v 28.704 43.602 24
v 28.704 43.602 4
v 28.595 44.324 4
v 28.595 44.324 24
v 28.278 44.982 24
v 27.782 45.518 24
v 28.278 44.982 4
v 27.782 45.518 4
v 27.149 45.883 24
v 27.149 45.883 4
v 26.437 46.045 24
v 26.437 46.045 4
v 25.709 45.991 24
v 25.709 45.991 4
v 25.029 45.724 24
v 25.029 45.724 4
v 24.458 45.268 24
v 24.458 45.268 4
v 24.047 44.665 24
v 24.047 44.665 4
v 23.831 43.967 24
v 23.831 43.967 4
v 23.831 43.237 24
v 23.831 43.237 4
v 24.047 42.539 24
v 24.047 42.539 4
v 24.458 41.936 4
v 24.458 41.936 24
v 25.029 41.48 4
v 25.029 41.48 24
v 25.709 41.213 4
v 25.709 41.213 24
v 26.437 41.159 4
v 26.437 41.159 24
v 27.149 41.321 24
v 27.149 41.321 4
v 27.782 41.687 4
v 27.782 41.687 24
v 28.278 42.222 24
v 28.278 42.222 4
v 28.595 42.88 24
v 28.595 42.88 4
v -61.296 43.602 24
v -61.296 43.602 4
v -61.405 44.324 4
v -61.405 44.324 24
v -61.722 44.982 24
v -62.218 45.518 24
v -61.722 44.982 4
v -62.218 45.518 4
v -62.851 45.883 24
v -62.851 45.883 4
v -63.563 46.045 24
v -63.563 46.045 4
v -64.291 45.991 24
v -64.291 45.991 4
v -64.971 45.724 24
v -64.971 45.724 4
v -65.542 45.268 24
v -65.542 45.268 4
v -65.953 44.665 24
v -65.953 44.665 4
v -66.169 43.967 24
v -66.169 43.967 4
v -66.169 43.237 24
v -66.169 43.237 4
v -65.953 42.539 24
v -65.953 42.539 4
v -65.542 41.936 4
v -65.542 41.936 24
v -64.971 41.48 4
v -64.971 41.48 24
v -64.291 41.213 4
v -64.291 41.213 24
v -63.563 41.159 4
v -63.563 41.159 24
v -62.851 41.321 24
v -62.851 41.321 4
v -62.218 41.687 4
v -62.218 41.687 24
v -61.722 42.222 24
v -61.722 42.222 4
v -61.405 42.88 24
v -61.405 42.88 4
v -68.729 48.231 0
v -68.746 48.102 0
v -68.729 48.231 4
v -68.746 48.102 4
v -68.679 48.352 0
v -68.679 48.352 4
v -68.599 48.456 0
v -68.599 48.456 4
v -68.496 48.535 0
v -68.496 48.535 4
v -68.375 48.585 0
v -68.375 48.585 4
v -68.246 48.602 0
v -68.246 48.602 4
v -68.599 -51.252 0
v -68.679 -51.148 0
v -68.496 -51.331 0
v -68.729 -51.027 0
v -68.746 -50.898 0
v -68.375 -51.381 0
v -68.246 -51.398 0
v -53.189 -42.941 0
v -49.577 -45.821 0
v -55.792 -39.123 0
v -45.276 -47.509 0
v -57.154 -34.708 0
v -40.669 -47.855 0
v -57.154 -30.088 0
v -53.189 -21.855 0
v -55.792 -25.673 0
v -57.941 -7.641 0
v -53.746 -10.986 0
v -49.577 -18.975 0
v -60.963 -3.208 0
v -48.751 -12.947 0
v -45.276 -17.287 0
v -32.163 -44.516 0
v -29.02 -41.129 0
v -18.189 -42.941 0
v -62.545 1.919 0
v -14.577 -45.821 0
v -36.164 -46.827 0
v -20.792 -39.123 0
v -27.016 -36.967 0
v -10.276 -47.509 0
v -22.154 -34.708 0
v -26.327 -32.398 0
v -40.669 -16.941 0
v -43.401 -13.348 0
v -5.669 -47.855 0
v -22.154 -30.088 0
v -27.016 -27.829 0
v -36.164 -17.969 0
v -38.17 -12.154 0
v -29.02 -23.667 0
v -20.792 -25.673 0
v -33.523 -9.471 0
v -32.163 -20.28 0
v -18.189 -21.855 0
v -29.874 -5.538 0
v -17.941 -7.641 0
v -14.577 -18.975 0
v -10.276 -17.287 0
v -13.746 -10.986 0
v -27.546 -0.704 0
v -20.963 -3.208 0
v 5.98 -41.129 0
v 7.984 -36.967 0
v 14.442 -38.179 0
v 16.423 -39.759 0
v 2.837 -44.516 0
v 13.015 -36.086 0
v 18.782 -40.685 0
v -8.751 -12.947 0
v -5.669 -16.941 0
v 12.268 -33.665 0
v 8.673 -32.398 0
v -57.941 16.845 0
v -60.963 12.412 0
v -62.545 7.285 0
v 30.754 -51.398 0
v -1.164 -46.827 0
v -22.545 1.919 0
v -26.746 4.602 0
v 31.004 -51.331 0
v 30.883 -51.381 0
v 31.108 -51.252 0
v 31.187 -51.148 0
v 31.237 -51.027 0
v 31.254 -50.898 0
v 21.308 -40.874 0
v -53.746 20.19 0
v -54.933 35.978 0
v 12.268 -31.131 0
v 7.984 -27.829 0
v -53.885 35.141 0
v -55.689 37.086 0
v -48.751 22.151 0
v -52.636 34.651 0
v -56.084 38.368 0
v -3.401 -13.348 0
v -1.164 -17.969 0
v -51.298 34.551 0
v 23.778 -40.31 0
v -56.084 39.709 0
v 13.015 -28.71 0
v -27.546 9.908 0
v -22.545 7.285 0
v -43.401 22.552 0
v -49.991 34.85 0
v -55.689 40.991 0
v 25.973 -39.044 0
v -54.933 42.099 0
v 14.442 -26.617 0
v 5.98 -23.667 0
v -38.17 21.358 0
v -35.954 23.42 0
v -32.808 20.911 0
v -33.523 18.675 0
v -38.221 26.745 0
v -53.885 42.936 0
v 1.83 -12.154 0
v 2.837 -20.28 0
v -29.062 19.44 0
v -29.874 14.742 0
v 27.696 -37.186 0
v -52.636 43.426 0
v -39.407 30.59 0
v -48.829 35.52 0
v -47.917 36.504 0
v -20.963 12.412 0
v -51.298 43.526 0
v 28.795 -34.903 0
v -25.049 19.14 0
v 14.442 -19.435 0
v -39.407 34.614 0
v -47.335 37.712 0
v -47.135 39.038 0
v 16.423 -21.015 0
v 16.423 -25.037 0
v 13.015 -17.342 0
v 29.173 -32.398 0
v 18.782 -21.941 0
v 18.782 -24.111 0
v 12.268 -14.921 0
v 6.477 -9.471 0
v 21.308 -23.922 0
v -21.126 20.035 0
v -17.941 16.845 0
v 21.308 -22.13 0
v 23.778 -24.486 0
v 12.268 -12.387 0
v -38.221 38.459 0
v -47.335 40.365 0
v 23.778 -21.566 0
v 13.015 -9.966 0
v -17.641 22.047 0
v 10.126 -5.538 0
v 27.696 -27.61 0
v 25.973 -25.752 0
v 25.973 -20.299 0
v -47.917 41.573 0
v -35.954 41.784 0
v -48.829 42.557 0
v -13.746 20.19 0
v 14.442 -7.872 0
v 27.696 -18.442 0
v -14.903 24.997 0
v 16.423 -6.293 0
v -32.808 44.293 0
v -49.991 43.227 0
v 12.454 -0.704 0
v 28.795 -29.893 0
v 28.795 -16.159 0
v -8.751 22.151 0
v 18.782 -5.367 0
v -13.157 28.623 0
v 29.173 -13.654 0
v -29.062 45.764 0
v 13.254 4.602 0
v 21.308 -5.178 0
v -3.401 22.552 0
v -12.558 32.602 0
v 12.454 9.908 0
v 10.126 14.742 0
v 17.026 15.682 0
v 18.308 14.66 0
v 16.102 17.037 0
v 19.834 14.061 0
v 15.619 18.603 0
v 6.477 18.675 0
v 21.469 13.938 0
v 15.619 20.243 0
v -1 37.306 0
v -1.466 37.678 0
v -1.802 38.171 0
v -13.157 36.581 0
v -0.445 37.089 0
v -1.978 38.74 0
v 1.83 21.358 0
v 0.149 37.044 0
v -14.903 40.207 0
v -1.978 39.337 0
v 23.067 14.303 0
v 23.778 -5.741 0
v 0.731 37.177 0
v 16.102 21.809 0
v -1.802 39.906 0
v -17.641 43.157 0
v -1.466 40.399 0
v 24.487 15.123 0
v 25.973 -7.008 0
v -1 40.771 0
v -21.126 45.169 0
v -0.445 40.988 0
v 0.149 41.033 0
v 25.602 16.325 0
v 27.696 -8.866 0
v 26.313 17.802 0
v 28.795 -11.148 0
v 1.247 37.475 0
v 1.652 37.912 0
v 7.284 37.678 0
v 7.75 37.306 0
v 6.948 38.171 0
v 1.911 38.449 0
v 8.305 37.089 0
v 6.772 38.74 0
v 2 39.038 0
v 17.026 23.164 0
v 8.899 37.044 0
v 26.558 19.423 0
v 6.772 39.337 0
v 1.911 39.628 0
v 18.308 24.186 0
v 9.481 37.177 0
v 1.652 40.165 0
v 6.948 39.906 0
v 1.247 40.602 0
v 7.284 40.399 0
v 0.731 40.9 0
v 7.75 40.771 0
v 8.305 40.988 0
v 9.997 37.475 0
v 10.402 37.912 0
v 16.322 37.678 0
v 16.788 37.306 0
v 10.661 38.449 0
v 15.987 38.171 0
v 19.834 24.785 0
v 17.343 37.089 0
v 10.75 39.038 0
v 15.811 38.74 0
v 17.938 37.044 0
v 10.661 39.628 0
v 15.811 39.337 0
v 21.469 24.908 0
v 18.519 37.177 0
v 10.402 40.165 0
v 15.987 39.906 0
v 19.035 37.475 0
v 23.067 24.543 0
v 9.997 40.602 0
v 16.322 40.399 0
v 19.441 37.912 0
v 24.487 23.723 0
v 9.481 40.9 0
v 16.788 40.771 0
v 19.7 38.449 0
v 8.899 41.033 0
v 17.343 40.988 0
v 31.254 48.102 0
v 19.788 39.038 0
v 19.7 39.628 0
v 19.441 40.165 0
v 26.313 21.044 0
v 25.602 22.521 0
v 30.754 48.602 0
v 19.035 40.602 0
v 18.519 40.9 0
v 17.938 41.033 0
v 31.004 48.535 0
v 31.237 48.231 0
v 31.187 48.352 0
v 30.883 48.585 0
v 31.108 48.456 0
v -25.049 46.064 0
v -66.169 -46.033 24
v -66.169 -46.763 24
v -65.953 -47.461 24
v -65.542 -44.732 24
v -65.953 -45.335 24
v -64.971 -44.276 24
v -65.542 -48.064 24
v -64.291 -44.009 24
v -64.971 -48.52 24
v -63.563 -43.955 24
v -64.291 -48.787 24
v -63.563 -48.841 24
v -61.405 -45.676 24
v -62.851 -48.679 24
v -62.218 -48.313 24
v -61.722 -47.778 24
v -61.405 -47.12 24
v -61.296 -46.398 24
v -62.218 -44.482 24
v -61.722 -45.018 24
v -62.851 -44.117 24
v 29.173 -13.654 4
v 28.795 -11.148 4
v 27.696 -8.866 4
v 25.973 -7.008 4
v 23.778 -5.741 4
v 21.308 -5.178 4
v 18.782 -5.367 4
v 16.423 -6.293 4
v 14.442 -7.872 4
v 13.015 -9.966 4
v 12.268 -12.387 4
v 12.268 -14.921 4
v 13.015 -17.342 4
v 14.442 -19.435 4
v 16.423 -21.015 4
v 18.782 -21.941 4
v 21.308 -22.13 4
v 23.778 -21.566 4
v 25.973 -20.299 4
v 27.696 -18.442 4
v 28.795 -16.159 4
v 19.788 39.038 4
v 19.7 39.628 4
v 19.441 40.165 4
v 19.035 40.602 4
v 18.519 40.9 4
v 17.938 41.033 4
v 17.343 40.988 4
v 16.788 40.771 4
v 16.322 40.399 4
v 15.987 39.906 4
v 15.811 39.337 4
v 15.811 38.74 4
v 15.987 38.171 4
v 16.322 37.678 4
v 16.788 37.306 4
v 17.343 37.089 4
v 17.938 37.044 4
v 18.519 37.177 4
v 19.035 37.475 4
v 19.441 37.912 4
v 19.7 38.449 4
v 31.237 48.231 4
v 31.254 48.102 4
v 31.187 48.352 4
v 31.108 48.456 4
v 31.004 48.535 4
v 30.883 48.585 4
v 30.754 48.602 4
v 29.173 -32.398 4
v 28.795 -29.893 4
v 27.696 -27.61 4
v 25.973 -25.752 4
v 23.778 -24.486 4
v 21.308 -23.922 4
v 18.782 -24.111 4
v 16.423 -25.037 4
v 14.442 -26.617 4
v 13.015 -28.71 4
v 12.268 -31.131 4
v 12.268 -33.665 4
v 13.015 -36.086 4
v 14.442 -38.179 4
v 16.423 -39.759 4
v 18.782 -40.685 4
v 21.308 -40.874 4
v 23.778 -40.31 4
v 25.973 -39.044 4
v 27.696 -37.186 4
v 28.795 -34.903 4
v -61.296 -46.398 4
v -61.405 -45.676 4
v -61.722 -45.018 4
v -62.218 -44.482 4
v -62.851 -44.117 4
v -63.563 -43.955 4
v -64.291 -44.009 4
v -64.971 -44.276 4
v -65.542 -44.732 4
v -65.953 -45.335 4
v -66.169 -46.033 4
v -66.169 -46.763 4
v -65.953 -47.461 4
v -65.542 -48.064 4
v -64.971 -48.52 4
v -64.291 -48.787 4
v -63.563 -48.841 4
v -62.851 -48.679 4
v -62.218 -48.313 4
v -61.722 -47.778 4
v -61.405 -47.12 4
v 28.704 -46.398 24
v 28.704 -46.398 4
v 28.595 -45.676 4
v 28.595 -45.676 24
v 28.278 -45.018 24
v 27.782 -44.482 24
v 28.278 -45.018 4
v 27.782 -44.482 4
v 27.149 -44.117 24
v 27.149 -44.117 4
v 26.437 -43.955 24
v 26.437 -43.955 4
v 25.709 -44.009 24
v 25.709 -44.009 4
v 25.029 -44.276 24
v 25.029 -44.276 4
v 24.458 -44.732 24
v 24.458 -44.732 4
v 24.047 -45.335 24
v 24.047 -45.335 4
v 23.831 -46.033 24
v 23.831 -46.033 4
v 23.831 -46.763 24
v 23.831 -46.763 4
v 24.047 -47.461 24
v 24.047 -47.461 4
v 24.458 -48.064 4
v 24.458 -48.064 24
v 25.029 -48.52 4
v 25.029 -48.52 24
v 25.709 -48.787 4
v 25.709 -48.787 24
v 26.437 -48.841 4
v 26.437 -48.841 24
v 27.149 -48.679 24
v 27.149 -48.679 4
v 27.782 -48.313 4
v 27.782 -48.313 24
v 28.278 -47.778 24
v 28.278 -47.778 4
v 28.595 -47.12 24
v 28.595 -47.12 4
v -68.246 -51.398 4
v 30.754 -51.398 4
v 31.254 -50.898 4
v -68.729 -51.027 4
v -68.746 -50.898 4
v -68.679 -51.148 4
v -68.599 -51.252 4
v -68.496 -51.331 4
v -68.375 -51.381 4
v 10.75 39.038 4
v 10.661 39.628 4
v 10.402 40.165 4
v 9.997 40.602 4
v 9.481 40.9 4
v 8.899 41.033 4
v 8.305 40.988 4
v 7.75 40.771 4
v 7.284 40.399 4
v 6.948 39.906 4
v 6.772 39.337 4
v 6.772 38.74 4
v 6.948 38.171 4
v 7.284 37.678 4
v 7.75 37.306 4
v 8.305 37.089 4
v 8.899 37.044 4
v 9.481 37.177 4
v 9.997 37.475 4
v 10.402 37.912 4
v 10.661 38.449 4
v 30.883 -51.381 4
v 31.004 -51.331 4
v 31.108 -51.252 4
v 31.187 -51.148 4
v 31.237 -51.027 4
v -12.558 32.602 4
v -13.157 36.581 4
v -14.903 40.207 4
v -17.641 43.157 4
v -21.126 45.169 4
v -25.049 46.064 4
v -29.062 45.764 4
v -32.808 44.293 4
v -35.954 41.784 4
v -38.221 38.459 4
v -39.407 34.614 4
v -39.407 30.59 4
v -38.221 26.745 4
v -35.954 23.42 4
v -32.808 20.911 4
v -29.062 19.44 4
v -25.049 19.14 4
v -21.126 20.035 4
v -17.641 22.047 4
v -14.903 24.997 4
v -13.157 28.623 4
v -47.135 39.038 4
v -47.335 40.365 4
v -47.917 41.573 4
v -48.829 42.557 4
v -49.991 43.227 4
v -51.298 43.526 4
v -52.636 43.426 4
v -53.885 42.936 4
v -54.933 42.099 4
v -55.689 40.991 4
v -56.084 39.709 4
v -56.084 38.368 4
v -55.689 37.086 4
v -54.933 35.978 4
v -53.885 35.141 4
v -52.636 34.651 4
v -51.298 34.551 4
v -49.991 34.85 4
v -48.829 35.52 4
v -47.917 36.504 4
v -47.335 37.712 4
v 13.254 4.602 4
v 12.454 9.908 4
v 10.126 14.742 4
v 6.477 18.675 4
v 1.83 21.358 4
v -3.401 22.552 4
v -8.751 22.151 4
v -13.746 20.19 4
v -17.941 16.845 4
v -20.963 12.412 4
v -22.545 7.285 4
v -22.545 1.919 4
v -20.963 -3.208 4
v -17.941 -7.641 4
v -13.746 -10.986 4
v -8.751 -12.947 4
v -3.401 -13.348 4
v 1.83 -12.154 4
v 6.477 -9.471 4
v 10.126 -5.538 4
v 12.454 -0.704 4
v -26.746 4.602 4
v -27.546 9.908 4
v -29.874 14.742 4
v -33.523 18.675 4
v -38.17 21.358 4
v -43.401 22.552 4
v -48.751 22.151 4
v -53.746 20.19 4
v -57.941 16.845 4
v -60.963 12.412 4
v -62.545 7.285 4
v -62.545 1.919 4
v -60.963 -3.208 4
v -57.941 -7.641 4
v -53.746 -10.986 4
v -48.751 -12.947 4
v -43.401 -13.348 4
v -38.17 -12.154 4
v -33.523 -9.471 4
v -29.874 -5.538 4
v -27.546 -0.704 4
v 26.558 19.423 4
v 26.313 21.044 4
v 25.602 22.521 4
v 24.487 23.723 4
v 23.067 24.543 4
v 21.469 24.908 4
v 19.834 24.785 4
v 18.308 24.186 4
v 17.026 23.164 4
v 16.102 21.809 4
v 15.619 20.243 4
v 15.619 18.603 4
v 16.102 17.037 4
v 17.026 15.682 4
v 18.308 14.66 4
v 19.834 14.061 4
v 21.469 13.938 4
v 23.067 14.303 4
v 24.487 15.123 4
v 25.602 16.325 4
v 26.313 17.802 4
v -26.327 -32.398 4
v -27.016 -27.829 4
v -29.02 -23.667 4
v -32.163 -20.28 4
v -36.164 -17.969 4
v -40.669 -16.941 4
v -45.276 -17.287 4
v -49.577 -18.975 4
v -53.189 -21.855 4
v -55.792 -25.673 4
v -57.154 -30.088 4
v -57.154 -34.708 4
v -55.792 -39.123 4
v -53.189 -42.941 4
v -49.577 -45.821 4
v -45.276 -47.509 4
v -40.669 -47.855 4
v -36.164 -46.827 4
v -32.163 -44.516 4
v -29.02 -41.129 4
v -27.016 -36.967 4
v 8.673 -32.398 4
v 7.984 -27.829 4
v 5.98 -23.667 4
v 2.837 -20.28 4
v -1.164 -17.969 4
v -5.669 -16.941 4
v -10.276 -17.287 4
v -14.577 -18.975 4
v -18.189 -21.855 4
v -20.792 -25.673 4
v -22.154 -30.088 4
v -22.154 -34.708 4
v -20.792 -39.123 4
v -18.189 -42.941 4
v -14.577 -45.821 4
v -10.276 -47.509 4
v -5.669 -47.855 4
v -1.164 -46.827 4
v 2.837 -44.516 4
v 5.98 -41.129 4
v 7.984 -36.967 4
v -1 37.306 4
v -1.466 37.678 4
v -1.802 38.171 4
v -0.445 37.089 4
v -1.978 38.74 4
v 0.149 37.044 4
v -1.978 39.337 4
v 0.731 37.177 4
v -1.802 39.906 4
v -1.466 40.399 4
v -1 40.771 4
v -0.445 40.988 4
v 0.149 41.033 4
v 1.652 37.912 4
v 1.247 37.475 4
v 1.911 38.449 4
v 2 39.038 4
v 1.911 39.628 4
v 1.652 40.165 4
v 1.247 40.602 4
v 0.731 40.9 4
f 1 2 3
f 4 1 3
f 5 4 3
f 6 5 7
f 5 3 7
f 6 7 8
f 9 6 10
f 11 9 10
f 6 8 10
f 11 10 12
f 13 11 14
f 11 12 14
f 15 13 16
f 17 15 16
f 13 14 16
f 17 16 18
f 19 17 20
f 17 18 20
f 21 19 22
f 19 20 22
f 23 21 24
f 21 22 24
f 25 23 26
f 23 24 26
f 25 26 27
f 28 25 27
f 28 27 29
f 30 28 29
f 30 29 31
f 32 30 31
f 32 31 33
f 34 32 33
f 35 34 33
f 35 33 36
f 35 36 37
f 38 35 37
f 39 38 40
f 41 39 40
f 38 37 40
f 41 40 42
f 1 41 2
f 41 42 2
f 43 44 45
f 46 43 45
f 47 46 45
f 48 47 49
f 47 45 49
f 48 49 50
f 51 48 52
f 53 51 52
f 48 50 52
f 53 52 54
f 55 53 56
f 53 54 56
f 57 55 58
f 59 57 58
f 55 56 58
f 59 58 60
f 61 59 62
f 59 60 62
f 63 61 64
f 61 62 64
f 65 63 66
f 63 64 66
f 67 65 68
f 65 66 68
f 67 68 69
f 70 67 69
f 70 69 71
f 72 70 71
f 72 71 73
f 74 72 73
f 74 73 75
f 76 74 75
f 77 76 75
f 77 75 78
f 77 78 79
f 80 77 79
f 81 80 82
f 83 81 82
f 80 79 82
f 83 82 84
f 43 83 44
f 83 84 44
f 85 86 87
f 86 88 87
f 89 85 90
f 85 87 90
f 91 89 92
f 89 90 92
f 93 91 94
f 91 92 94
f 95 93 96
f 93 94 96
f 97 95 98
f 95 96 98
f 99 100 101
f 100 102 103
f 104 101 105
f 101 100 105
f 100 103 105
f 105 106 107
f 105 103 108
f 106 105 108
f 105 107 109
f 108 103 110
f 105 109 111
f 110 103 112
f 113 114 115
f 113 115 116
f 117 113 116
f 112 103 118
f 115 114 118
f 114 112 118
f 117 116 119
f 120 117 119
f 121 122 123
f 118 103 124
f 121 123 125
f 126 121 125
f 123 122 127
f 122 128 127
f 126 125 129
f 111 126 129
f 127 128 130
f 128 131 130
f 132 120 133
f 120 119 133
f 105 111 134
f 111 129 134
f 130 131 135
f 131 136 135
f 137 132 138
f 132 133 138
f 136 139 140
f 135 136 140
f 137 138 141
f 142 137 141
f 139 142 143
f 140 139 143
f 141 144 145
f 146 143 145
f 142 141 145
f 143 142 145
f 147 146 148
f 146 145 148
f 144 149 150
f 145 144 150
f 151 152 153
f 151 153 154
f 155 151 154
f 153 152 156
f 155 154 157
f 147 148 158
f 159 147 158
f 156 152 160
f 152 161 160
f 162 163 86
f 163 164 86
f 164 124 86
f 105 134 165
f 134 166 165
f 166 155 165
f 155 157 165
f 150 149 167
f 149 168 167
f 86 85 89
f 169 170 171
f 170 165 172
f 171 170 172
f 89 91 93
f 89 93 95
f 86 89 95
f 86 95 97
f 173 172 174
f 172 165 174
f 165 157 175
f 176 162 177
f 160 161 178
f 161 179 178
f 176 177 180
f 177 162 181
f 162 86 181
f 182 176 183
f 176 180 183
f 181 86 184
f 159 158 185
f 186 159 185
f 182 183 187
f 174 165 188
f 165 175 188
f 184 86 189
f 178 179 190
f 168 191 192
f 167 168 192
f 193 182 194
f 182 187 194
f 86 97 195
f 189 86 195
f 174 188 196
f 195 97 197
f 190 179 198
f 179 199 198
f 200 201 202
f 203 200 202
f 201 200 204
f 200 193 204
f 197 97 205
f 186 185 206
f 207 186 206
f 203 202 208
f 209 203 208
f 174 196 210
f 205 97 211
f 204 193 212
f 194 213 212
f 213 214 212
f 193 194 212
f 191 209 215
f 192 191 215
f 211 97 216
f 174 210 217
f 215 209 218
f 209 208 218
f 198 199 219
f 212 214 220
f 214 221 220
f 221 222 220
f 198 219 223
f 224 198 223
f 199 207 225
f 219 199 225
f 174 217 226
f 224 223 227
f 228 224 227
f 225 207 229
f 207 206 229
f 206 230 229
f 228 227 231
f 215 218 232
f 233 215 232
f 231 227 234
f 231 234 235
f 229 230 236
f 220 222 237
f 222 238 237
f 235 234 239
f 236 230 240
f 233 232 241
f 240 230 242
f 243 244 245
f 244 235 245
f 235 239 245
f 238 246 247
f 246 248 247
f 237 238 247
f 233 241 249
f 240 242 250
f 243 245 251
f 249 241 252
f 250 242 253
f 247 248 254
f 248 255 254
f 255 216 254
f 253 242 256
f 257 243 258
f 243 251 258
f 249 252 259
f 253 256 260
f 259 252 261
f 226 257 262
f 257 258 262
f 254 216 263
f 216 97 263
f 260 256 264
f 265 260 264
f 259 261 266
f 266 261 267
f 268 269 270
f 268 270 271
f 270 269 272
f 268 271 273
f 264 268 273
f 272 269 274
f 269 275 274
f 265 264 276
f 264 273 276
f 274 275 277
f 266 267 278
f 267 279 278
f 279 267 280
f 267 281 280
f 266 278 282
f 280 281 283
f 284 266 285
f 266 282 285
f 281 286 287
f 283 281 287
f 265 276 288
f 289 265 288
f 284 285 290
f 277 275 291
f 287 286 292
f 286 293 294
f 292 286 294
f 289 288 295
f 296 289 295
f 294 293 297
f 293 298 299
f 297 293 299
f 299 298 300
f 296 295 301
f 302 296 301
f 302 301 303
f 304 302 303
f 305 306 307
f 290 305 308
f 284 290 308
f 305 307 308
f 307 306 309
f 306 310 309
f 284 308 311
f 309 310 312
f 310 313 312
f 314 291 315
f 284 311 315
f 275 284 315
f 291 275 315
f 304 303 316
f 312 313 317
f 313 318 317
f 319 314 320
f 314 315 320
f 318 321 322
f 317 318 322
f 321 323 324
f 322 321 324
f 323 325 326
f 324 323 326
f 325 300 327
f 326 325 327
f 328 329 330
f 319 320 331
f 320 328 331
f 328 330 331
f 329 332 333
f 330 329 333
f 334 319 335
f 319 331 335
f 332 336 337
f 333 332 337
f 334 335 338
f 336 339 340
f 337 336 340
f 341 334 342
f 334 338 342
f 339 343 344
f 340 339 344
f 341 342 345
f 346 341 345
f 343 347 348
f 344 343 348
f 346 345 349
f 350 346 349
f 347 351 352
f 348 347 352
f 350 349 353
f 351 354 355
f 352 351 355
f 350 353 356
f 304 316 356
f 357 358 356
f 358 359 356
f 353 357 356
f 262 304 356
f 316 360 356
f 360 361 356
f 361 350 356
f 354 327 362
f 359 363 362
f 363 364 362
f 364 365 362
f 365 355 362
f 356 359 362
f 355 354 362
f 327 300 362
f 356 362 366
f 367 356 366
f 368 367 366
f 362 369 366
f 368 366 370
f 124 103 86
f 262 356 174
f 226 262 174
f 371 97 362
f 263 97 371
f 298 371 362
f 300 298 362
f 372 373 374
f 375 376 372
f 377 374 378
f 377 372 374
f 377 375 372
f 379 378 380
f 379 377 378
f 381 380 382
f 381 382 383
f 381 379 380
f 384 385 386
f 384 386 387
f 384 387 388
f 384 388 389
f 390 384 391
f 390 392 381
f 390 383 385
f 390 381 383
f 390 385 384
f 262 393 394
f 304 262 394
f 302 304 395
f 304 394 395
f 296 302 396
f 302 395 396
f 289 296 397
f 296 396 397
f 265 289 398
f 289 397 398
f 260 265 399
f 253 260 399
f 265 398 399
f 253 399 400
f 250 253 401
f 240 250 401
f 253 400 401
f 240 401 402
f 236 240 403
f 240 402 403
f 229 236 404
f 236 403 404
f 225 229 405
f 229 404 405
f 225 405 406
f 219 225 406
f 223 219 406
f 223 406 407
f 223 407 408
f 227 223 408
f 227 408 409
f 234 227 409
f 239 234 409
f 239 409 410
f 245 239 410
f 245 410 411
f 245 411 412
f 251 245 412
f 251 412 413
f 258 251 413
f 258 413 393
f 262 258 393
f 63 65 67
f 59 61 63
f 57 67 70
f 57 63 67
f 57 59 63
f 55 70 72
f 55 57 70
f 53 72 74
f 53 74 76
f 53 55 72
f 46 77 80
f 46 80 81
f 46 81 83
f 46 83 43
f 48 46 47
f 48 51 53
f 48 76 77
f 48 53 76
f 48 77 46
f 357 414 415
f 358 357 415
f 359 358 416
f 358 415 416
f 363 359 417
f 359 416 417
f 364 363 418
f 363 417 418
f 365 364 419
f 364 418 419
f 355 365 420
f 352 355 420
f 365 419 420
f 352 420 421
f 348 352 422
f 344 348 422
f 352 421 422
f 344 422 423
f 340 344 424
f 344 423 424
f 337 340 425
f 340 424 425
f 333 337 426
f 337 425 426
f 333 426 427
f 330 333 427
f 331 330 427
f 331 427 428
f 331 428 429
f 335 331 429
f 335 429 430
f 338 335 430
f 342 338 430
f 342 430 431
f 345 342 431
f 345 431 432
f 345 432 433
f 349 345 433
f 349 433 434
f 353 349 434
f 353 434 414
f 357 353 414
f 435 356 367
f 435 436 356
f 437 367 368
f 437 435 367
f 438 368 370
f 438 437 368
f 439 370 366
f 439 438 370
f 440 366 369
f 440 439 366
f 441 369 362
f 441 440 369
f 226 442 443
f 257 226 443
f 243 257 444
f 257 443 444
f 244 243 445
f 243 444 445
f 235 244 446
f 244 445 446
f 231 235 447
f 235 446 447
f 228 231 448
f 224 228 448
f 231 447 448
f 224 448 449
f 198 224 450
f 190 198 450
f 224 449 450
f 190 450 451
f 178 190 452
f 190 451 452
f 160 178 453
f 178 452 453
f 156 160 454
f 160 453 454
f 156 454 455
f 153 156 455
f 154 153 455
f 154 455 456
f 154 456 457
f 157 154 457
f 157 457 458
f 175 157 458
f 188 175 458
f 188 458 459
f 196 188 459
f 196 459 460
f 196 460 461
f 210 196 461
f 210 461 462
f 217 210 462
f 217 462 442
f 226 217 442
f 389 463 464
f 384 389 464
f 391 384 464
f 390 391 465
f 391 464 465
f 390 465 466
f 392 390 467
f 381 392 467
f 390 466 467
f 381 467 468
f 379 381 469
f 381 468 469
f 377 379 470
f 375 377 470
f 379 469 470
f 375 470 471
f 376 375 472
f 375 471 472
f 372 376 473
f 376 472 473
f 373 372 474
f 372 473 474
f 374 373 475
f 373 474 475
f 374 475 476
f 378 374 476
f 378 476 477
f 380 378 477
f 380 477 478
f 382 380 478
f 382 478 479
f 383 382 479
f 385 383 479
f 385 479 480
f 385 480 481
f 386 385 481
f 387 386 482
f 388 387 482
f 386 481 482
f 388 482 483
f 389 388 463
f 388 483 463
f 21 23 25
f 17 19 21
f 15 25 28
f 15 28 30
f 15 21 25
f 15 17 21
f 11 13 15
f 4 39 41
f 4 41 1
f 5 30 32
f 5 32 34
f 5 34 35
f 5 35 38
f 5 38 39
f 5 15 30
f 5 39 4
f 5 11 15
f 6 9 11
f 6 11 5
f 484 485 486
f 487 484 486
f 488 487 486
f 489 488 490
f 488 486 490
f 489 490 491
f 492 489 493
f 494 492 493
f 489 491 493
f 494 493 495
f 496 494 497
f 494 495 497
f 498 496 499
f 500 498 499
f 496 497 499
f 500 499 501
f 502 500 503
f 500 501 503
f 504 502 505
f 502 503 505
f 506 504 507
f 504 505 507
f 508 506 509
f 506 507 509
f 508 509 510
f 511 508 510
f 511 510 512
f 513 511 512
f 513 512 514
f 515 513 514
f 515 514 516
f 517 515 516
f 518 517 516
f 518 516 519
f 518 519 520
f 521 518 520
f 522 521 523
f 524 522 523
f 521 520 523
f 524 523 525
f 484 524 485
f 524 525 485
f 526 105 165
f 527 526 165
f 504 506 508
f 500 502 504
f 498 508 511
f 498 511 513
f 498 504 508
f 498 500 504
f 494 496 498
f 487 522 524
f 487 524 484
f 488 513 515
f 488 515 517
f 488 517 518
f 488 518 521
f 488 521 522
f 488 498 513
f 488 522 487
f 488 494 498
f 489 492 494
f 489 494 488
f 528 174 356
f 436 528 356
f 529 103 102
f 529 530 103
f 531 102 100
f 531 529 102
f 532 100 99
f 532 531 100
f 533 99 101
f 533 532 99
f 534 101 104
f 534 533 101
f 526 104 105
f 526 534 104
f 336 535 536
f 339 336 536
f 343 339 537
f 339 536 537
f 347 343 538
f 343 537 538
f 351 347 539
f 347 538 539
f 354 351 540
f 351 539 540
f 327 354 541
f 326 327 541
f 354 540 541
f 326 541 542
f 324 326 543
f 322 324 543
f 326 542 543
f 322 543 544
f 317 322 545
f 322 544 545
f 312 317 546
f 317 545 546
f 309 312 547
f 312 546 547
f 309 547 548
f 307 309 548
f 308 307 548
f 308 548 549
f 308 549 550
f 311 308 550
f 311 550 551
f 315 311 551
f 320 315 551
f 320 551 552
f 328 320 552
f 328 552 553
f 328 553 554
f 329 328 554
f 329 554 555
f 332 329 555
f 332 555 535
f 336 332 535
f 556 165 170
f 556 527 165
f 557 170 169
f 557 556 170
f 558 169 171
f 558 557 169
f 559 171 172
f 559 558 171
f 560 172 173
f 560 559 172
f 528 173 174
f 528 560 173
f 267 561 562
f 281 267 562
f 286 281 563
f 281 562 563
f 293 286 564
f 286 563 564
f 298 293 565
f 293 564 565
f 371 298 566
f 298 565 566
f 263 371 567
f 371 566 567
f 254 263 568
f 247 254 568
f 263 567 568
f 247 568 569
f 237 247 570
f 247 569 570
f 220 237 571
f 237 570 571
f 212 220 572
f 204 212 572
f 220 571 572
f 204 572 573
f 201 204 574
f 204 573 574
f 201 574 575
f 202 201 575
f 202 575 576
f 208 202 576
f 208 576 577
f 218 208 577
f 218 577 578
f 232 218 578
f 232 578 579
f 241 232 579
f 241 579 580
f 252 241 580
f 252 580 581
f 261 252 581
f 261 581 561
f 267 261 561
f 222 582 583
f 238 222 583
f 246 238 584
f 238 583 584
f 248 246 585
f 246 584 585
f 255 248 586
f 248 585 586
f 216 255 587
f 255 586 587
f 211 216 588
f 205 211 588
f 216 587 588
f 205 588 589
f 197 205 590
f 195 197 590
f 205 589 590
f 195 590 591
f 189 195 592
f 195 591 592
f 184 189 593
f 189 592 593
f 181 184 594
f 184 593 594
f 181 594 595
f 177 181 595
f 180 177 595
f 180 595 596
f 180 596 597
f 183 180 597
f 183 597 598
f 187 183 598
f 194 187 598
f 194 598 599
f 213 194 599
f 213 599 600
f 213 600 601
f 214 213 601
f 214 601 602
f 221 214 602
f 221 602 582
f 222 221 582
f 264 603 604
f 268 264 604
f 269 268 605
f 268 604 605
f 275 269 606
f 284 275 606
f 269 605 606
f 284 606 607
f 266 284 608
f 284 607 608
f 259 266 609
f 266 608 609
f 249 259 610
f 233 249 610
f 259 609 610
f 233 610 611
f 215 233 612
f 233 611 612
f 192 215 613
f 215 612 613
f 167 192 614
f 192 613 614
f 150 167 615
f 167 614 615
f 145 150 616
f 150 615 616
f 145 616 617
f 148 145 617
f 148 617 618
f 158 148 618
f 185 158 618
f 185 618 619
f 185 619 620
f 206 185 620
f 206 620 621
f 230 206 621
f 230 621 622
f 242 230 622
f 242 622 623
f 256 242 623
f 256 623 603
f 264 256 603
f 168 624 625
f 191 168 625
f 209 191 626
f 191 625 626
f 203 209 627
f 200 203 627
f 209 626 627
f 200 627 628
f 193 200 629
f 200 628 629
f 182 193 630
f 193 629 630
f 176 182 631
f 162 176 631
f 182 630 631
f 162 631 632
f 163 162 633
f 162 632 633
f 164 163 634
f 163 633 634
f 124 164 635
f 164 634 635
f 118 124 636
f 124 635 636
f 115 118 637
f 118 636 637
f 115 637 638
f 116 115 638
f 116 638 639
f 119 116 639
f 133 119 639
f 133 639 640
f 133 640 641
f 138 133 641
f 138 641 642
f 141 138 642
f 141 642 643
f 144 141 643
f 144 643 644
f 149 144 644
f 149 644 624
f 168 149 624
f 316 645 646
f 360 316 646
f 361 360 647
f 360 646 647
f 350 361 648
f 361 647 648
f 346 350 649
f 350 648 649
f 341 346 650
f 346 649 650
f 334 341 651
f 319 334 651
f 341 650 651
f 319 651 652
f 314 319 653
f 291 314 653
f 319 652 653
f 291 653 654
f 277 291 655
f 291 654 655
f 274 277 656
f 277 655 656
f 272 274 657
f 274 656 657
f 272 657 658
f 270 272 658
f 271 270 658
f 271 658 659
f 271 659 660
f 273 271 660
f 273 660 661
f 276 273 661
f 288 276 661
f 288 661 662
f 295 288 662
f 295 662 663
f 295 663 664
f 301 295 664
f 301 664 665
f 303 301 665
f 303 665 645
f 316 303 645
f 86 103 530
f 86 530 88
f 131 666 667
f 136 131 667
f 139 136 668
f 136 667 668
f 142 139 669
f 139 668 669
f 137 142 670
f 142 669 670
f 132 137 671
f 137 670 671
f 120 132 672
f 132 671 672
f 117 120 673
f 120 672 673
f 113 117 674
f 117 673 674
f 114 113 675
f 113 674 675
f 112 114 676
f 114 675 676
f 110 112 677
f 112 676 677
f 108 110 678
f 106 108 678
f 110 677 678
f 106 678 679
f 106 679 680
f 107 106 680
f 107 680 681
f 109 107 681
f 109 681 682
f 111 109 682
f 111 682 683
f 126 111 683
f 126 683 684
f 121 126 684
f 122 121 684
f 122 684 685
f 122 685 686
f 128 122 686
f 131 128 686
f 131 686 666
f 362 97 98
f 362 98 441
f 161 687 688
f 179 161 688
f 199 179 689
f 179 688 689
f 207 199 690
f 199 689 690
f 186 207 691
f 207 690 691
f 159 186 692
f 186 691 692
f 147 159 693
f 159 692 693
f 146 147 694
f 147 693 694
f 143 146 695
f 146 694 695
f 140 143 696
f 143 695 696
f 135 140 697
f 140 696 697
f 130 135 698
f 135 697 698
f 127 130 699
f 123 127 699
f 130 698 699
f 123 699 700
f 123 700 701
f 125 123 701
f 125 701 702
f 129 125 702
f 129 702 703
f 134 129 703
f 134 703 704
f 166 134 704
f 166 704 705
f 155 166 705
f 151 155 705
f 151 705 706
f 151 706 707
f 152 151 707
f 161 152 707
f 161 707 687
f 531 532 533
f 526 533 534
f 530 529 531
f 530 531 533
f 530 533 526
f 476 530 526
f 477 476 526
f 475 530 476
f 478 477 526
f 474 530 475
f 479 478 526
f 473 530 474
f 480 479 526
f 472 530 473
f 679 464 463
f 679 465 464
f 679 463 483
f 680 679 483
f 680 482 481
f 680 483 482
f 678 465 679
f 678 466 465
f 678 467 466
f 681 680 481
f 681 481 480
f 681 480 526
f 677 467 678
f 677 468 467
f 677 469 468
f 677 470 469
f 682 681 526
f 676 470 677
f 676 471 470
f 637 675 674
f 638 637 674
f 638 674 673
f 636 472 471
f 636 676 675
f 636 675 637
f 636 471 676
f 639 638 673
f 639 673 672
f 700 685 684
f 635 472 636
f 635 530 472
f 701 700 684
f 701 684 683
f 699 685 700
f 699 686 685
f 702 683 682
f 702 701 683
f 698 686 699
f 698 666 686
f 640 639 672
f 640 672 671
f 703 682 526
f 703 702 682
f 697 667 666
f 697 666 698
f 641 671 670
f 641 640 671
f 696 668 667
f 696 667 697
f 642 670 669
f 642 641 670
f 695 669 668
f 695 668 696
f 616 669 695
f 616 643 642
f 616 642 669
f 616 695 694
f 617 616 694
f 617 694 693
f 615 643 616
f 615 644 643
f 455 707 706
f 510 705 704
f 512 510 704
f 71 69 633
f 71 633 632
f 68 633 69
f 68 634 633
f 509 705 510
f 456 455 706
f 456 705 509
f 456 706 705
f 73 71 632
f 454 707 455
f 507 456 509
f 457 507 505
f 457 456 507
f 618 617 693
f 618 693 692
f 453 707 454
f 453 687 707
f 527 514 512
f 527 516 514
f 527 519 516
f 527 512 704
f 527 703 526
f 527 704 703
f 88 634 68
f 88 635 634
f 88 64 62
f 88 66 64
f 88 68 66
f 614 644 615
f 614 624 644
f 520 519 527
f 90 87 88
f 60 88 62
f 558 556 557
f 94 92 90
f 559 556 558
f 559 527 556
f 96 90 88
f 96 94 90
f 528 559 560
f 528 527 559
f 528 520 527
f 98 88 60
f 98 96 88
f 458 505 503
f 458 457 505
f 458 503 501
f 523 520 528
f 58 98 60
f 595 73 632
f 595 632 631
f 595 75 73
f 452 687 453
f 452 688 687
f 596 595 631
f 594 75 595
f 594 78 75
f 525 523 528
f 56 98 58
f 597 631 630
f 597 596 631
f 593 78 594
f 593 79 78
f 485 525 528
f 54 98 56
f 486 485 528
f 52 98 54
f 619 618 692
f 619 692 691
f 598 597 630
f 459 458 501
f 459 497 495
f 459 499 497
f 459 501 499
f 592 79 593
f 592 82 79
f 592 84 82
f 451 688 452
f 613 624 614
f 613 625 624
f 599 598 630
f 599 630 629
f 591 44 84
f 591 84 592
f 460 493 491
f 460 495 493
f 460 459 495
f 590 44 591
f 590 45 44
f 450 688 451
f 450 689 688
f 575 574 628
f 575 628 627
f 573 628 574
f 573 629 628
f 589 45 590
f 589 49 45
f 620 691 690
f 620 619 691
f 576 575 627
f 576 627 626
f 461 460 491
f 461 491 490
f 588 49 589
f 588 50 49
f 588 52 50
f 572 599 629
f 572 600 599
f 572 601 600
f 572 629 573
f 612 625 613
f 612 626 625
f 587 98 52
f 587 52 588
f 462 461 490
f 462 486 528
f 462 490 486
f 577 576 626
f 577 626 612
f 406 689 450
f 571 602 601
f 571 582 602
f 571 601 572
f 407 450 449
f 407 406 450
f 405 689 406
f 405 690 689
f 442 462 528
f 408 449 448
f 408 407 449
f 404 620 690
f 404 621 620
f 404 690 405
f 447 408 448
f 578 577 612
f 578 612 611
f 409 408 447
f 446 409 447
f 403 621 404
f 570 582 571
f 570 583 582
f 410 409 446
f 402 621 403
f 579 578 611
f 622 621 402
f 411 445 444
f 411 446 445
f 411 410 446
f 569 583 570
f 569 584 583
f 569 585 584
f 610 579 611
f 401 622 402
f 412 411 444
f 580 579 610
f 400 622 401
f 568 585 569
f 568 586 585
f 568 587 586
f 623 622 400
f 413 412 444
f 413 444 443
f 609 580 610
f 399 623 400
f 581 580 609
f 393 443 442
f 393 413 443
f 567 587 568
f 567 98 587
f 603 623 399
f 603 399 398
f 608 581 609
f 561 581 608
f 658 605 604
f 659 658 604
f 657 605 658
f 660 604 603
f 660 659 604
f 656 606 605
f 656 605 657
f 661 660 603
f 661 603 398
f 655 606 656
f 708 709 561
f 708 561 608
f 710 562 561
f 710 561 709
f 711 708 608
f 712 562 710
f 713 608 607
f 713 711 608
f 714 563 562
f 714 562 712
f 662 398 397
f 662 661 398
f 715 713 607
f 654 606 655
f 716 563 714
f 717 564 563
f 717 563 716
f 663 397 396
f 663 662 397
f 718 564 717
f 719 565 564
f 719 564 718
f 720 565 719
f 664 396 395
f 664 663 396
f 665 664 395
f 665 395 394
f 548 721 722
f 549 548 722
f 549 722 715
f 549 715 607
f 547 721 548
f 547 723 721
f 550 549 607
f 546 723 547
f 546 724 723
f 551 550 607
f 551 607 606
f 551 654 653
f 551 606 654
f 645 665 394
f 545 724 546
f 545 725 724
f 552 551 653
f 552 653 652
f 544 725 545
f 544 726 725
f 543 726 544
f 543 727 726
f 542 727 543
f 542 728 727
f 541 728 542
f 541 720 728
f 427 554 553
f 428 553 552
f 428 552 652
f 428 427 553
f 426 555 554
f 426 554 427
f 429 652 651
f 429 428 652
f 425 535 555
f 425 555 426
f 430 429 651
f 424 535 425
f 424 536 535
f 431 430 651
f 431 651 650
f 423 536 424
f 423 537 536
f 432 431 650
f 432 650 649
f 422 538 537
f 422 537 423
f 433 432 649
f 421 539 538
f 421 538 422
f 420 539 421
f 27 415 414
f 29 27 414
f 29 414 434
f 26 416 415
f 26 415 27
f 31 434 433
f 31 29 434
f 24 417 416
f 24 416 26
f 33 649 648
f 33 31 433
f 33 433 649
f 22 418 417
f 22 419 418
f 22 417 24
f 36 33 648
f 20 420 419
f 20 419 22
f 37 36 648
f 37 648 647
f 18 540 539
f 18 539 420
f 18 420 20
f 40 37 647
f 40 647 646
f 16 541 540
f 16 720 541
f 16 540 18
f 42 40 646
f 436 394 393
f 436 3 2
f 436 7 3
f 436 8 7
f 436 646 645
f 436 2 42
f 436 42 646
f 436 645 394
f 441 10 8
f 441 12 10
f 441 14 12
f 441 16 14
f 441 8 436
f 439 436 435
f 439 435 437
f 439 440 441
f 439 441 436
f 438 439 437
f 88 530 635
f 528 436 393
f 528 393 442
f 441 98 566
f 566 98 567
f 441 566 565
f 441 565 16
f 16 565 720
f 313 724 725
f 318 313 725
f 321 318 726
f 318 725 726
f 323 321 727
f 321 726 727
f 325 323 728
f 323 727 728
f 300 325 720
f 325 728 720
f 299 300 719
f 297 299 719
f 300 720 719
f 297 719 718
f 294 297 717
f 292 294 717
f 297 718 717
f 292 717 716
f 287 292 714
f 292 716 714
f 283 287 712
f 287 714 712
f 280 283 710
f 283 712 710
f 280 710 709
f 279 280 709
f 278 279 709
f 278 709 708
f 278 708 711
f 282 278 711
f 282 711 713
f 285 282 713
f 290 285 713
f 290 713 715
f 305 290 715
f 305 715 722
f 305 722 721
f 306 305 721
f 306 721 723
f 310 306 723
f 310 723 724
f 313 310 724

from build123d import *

# Parameters (mm, degrees)
F0_W     = 100
F0_H     = 100
F1_DEPTH = 4
F2_R     = 0.5
F3_R     = 2.45
F4_DEPTH = 20
F5_R     = 4.5
F5_R_2   = 13.5
F5_R_3   = 2
F5_R_4   = 5.5
F5_R_5   = 18
F5_R_6   = 15.5
F5_R_7   = 8.5
F6_DEPTH = 25


with BuildPart() as f1:
    # F0 (on Top) → F1 (new body)
    with BuildSketch(Plane.XY):
        with Locations((-18.745929, -1.397985)):
            Rectangle(F0_W, F0_H)
    extrude(amount=F1_DEPTH)

    # F2
    f2_edges = [f1.edges().sort_by_distance(p)[0] for p in [
        (-68.745929, 48.602015, 2),
        (31.254071, 48.602015, 2),
        (31.254071, -51.397985, 2),
        (-68.745929, -51.397985, 2),
    ]]
    fillet(f2_edges, radius=F2_R)

    # F3 (on face) → F4 (join)
    with BuildSketch(Plane.XY.offset(4)):
        with Locations((-63.745929, 43.602015)):
            Circle(F3_R)
        with Locations((26.254071, 43.602015)):
            Circle(F3_R)
        with Locations((-63.745929, -46.397985)):
            Circle(F3_R)
        with Locations((26.254071, -46.397985)):
            Circle(F3_R)
    extrude(amount=F4_DEPTH)

    # F5 (on face) → F6 (cut)
    with BuildSketch(Plane.XY.offset(4)):
        with Locations((-51.634617, 39.038464)):
            Circle(F5_R)
        with Locations((-26.057692, 32.602015)):
            Circle(F5_R_2)
        with Locations((0, 39.038464)):
            Circle(F5_R_3)
        with Locations((8.75, 39.038464)):
            Circle(F5_R_3)
        with Locations((17.78846, 39.038464)):
            Circle(F5_R_3)
        with Locations((21.057691, 19.423077)):
            Circle(F5_R_4)
        with Locations((-4.745929, 4.602015)):
            Circle(F5_R_5)
        with Locations((-44.745929, 4.602015)):
            Circle(F5_R_5)
        with Locations((-41.826926, -32.397985)):
            Circle(F5_R_6)
        with Locations((-6.826926, -32.397985)):
            Circle(F5_R_6)
        with Locations((20.673078, -13.653847)):
            Circle(F5_R_7)
        with Locations((20.673078, -32.397985)):
            Circle(F5_R_7)
    extrude(amount=-F6_DEPTH, mode=Mode.SUBTRACT)


solid = f1.part
